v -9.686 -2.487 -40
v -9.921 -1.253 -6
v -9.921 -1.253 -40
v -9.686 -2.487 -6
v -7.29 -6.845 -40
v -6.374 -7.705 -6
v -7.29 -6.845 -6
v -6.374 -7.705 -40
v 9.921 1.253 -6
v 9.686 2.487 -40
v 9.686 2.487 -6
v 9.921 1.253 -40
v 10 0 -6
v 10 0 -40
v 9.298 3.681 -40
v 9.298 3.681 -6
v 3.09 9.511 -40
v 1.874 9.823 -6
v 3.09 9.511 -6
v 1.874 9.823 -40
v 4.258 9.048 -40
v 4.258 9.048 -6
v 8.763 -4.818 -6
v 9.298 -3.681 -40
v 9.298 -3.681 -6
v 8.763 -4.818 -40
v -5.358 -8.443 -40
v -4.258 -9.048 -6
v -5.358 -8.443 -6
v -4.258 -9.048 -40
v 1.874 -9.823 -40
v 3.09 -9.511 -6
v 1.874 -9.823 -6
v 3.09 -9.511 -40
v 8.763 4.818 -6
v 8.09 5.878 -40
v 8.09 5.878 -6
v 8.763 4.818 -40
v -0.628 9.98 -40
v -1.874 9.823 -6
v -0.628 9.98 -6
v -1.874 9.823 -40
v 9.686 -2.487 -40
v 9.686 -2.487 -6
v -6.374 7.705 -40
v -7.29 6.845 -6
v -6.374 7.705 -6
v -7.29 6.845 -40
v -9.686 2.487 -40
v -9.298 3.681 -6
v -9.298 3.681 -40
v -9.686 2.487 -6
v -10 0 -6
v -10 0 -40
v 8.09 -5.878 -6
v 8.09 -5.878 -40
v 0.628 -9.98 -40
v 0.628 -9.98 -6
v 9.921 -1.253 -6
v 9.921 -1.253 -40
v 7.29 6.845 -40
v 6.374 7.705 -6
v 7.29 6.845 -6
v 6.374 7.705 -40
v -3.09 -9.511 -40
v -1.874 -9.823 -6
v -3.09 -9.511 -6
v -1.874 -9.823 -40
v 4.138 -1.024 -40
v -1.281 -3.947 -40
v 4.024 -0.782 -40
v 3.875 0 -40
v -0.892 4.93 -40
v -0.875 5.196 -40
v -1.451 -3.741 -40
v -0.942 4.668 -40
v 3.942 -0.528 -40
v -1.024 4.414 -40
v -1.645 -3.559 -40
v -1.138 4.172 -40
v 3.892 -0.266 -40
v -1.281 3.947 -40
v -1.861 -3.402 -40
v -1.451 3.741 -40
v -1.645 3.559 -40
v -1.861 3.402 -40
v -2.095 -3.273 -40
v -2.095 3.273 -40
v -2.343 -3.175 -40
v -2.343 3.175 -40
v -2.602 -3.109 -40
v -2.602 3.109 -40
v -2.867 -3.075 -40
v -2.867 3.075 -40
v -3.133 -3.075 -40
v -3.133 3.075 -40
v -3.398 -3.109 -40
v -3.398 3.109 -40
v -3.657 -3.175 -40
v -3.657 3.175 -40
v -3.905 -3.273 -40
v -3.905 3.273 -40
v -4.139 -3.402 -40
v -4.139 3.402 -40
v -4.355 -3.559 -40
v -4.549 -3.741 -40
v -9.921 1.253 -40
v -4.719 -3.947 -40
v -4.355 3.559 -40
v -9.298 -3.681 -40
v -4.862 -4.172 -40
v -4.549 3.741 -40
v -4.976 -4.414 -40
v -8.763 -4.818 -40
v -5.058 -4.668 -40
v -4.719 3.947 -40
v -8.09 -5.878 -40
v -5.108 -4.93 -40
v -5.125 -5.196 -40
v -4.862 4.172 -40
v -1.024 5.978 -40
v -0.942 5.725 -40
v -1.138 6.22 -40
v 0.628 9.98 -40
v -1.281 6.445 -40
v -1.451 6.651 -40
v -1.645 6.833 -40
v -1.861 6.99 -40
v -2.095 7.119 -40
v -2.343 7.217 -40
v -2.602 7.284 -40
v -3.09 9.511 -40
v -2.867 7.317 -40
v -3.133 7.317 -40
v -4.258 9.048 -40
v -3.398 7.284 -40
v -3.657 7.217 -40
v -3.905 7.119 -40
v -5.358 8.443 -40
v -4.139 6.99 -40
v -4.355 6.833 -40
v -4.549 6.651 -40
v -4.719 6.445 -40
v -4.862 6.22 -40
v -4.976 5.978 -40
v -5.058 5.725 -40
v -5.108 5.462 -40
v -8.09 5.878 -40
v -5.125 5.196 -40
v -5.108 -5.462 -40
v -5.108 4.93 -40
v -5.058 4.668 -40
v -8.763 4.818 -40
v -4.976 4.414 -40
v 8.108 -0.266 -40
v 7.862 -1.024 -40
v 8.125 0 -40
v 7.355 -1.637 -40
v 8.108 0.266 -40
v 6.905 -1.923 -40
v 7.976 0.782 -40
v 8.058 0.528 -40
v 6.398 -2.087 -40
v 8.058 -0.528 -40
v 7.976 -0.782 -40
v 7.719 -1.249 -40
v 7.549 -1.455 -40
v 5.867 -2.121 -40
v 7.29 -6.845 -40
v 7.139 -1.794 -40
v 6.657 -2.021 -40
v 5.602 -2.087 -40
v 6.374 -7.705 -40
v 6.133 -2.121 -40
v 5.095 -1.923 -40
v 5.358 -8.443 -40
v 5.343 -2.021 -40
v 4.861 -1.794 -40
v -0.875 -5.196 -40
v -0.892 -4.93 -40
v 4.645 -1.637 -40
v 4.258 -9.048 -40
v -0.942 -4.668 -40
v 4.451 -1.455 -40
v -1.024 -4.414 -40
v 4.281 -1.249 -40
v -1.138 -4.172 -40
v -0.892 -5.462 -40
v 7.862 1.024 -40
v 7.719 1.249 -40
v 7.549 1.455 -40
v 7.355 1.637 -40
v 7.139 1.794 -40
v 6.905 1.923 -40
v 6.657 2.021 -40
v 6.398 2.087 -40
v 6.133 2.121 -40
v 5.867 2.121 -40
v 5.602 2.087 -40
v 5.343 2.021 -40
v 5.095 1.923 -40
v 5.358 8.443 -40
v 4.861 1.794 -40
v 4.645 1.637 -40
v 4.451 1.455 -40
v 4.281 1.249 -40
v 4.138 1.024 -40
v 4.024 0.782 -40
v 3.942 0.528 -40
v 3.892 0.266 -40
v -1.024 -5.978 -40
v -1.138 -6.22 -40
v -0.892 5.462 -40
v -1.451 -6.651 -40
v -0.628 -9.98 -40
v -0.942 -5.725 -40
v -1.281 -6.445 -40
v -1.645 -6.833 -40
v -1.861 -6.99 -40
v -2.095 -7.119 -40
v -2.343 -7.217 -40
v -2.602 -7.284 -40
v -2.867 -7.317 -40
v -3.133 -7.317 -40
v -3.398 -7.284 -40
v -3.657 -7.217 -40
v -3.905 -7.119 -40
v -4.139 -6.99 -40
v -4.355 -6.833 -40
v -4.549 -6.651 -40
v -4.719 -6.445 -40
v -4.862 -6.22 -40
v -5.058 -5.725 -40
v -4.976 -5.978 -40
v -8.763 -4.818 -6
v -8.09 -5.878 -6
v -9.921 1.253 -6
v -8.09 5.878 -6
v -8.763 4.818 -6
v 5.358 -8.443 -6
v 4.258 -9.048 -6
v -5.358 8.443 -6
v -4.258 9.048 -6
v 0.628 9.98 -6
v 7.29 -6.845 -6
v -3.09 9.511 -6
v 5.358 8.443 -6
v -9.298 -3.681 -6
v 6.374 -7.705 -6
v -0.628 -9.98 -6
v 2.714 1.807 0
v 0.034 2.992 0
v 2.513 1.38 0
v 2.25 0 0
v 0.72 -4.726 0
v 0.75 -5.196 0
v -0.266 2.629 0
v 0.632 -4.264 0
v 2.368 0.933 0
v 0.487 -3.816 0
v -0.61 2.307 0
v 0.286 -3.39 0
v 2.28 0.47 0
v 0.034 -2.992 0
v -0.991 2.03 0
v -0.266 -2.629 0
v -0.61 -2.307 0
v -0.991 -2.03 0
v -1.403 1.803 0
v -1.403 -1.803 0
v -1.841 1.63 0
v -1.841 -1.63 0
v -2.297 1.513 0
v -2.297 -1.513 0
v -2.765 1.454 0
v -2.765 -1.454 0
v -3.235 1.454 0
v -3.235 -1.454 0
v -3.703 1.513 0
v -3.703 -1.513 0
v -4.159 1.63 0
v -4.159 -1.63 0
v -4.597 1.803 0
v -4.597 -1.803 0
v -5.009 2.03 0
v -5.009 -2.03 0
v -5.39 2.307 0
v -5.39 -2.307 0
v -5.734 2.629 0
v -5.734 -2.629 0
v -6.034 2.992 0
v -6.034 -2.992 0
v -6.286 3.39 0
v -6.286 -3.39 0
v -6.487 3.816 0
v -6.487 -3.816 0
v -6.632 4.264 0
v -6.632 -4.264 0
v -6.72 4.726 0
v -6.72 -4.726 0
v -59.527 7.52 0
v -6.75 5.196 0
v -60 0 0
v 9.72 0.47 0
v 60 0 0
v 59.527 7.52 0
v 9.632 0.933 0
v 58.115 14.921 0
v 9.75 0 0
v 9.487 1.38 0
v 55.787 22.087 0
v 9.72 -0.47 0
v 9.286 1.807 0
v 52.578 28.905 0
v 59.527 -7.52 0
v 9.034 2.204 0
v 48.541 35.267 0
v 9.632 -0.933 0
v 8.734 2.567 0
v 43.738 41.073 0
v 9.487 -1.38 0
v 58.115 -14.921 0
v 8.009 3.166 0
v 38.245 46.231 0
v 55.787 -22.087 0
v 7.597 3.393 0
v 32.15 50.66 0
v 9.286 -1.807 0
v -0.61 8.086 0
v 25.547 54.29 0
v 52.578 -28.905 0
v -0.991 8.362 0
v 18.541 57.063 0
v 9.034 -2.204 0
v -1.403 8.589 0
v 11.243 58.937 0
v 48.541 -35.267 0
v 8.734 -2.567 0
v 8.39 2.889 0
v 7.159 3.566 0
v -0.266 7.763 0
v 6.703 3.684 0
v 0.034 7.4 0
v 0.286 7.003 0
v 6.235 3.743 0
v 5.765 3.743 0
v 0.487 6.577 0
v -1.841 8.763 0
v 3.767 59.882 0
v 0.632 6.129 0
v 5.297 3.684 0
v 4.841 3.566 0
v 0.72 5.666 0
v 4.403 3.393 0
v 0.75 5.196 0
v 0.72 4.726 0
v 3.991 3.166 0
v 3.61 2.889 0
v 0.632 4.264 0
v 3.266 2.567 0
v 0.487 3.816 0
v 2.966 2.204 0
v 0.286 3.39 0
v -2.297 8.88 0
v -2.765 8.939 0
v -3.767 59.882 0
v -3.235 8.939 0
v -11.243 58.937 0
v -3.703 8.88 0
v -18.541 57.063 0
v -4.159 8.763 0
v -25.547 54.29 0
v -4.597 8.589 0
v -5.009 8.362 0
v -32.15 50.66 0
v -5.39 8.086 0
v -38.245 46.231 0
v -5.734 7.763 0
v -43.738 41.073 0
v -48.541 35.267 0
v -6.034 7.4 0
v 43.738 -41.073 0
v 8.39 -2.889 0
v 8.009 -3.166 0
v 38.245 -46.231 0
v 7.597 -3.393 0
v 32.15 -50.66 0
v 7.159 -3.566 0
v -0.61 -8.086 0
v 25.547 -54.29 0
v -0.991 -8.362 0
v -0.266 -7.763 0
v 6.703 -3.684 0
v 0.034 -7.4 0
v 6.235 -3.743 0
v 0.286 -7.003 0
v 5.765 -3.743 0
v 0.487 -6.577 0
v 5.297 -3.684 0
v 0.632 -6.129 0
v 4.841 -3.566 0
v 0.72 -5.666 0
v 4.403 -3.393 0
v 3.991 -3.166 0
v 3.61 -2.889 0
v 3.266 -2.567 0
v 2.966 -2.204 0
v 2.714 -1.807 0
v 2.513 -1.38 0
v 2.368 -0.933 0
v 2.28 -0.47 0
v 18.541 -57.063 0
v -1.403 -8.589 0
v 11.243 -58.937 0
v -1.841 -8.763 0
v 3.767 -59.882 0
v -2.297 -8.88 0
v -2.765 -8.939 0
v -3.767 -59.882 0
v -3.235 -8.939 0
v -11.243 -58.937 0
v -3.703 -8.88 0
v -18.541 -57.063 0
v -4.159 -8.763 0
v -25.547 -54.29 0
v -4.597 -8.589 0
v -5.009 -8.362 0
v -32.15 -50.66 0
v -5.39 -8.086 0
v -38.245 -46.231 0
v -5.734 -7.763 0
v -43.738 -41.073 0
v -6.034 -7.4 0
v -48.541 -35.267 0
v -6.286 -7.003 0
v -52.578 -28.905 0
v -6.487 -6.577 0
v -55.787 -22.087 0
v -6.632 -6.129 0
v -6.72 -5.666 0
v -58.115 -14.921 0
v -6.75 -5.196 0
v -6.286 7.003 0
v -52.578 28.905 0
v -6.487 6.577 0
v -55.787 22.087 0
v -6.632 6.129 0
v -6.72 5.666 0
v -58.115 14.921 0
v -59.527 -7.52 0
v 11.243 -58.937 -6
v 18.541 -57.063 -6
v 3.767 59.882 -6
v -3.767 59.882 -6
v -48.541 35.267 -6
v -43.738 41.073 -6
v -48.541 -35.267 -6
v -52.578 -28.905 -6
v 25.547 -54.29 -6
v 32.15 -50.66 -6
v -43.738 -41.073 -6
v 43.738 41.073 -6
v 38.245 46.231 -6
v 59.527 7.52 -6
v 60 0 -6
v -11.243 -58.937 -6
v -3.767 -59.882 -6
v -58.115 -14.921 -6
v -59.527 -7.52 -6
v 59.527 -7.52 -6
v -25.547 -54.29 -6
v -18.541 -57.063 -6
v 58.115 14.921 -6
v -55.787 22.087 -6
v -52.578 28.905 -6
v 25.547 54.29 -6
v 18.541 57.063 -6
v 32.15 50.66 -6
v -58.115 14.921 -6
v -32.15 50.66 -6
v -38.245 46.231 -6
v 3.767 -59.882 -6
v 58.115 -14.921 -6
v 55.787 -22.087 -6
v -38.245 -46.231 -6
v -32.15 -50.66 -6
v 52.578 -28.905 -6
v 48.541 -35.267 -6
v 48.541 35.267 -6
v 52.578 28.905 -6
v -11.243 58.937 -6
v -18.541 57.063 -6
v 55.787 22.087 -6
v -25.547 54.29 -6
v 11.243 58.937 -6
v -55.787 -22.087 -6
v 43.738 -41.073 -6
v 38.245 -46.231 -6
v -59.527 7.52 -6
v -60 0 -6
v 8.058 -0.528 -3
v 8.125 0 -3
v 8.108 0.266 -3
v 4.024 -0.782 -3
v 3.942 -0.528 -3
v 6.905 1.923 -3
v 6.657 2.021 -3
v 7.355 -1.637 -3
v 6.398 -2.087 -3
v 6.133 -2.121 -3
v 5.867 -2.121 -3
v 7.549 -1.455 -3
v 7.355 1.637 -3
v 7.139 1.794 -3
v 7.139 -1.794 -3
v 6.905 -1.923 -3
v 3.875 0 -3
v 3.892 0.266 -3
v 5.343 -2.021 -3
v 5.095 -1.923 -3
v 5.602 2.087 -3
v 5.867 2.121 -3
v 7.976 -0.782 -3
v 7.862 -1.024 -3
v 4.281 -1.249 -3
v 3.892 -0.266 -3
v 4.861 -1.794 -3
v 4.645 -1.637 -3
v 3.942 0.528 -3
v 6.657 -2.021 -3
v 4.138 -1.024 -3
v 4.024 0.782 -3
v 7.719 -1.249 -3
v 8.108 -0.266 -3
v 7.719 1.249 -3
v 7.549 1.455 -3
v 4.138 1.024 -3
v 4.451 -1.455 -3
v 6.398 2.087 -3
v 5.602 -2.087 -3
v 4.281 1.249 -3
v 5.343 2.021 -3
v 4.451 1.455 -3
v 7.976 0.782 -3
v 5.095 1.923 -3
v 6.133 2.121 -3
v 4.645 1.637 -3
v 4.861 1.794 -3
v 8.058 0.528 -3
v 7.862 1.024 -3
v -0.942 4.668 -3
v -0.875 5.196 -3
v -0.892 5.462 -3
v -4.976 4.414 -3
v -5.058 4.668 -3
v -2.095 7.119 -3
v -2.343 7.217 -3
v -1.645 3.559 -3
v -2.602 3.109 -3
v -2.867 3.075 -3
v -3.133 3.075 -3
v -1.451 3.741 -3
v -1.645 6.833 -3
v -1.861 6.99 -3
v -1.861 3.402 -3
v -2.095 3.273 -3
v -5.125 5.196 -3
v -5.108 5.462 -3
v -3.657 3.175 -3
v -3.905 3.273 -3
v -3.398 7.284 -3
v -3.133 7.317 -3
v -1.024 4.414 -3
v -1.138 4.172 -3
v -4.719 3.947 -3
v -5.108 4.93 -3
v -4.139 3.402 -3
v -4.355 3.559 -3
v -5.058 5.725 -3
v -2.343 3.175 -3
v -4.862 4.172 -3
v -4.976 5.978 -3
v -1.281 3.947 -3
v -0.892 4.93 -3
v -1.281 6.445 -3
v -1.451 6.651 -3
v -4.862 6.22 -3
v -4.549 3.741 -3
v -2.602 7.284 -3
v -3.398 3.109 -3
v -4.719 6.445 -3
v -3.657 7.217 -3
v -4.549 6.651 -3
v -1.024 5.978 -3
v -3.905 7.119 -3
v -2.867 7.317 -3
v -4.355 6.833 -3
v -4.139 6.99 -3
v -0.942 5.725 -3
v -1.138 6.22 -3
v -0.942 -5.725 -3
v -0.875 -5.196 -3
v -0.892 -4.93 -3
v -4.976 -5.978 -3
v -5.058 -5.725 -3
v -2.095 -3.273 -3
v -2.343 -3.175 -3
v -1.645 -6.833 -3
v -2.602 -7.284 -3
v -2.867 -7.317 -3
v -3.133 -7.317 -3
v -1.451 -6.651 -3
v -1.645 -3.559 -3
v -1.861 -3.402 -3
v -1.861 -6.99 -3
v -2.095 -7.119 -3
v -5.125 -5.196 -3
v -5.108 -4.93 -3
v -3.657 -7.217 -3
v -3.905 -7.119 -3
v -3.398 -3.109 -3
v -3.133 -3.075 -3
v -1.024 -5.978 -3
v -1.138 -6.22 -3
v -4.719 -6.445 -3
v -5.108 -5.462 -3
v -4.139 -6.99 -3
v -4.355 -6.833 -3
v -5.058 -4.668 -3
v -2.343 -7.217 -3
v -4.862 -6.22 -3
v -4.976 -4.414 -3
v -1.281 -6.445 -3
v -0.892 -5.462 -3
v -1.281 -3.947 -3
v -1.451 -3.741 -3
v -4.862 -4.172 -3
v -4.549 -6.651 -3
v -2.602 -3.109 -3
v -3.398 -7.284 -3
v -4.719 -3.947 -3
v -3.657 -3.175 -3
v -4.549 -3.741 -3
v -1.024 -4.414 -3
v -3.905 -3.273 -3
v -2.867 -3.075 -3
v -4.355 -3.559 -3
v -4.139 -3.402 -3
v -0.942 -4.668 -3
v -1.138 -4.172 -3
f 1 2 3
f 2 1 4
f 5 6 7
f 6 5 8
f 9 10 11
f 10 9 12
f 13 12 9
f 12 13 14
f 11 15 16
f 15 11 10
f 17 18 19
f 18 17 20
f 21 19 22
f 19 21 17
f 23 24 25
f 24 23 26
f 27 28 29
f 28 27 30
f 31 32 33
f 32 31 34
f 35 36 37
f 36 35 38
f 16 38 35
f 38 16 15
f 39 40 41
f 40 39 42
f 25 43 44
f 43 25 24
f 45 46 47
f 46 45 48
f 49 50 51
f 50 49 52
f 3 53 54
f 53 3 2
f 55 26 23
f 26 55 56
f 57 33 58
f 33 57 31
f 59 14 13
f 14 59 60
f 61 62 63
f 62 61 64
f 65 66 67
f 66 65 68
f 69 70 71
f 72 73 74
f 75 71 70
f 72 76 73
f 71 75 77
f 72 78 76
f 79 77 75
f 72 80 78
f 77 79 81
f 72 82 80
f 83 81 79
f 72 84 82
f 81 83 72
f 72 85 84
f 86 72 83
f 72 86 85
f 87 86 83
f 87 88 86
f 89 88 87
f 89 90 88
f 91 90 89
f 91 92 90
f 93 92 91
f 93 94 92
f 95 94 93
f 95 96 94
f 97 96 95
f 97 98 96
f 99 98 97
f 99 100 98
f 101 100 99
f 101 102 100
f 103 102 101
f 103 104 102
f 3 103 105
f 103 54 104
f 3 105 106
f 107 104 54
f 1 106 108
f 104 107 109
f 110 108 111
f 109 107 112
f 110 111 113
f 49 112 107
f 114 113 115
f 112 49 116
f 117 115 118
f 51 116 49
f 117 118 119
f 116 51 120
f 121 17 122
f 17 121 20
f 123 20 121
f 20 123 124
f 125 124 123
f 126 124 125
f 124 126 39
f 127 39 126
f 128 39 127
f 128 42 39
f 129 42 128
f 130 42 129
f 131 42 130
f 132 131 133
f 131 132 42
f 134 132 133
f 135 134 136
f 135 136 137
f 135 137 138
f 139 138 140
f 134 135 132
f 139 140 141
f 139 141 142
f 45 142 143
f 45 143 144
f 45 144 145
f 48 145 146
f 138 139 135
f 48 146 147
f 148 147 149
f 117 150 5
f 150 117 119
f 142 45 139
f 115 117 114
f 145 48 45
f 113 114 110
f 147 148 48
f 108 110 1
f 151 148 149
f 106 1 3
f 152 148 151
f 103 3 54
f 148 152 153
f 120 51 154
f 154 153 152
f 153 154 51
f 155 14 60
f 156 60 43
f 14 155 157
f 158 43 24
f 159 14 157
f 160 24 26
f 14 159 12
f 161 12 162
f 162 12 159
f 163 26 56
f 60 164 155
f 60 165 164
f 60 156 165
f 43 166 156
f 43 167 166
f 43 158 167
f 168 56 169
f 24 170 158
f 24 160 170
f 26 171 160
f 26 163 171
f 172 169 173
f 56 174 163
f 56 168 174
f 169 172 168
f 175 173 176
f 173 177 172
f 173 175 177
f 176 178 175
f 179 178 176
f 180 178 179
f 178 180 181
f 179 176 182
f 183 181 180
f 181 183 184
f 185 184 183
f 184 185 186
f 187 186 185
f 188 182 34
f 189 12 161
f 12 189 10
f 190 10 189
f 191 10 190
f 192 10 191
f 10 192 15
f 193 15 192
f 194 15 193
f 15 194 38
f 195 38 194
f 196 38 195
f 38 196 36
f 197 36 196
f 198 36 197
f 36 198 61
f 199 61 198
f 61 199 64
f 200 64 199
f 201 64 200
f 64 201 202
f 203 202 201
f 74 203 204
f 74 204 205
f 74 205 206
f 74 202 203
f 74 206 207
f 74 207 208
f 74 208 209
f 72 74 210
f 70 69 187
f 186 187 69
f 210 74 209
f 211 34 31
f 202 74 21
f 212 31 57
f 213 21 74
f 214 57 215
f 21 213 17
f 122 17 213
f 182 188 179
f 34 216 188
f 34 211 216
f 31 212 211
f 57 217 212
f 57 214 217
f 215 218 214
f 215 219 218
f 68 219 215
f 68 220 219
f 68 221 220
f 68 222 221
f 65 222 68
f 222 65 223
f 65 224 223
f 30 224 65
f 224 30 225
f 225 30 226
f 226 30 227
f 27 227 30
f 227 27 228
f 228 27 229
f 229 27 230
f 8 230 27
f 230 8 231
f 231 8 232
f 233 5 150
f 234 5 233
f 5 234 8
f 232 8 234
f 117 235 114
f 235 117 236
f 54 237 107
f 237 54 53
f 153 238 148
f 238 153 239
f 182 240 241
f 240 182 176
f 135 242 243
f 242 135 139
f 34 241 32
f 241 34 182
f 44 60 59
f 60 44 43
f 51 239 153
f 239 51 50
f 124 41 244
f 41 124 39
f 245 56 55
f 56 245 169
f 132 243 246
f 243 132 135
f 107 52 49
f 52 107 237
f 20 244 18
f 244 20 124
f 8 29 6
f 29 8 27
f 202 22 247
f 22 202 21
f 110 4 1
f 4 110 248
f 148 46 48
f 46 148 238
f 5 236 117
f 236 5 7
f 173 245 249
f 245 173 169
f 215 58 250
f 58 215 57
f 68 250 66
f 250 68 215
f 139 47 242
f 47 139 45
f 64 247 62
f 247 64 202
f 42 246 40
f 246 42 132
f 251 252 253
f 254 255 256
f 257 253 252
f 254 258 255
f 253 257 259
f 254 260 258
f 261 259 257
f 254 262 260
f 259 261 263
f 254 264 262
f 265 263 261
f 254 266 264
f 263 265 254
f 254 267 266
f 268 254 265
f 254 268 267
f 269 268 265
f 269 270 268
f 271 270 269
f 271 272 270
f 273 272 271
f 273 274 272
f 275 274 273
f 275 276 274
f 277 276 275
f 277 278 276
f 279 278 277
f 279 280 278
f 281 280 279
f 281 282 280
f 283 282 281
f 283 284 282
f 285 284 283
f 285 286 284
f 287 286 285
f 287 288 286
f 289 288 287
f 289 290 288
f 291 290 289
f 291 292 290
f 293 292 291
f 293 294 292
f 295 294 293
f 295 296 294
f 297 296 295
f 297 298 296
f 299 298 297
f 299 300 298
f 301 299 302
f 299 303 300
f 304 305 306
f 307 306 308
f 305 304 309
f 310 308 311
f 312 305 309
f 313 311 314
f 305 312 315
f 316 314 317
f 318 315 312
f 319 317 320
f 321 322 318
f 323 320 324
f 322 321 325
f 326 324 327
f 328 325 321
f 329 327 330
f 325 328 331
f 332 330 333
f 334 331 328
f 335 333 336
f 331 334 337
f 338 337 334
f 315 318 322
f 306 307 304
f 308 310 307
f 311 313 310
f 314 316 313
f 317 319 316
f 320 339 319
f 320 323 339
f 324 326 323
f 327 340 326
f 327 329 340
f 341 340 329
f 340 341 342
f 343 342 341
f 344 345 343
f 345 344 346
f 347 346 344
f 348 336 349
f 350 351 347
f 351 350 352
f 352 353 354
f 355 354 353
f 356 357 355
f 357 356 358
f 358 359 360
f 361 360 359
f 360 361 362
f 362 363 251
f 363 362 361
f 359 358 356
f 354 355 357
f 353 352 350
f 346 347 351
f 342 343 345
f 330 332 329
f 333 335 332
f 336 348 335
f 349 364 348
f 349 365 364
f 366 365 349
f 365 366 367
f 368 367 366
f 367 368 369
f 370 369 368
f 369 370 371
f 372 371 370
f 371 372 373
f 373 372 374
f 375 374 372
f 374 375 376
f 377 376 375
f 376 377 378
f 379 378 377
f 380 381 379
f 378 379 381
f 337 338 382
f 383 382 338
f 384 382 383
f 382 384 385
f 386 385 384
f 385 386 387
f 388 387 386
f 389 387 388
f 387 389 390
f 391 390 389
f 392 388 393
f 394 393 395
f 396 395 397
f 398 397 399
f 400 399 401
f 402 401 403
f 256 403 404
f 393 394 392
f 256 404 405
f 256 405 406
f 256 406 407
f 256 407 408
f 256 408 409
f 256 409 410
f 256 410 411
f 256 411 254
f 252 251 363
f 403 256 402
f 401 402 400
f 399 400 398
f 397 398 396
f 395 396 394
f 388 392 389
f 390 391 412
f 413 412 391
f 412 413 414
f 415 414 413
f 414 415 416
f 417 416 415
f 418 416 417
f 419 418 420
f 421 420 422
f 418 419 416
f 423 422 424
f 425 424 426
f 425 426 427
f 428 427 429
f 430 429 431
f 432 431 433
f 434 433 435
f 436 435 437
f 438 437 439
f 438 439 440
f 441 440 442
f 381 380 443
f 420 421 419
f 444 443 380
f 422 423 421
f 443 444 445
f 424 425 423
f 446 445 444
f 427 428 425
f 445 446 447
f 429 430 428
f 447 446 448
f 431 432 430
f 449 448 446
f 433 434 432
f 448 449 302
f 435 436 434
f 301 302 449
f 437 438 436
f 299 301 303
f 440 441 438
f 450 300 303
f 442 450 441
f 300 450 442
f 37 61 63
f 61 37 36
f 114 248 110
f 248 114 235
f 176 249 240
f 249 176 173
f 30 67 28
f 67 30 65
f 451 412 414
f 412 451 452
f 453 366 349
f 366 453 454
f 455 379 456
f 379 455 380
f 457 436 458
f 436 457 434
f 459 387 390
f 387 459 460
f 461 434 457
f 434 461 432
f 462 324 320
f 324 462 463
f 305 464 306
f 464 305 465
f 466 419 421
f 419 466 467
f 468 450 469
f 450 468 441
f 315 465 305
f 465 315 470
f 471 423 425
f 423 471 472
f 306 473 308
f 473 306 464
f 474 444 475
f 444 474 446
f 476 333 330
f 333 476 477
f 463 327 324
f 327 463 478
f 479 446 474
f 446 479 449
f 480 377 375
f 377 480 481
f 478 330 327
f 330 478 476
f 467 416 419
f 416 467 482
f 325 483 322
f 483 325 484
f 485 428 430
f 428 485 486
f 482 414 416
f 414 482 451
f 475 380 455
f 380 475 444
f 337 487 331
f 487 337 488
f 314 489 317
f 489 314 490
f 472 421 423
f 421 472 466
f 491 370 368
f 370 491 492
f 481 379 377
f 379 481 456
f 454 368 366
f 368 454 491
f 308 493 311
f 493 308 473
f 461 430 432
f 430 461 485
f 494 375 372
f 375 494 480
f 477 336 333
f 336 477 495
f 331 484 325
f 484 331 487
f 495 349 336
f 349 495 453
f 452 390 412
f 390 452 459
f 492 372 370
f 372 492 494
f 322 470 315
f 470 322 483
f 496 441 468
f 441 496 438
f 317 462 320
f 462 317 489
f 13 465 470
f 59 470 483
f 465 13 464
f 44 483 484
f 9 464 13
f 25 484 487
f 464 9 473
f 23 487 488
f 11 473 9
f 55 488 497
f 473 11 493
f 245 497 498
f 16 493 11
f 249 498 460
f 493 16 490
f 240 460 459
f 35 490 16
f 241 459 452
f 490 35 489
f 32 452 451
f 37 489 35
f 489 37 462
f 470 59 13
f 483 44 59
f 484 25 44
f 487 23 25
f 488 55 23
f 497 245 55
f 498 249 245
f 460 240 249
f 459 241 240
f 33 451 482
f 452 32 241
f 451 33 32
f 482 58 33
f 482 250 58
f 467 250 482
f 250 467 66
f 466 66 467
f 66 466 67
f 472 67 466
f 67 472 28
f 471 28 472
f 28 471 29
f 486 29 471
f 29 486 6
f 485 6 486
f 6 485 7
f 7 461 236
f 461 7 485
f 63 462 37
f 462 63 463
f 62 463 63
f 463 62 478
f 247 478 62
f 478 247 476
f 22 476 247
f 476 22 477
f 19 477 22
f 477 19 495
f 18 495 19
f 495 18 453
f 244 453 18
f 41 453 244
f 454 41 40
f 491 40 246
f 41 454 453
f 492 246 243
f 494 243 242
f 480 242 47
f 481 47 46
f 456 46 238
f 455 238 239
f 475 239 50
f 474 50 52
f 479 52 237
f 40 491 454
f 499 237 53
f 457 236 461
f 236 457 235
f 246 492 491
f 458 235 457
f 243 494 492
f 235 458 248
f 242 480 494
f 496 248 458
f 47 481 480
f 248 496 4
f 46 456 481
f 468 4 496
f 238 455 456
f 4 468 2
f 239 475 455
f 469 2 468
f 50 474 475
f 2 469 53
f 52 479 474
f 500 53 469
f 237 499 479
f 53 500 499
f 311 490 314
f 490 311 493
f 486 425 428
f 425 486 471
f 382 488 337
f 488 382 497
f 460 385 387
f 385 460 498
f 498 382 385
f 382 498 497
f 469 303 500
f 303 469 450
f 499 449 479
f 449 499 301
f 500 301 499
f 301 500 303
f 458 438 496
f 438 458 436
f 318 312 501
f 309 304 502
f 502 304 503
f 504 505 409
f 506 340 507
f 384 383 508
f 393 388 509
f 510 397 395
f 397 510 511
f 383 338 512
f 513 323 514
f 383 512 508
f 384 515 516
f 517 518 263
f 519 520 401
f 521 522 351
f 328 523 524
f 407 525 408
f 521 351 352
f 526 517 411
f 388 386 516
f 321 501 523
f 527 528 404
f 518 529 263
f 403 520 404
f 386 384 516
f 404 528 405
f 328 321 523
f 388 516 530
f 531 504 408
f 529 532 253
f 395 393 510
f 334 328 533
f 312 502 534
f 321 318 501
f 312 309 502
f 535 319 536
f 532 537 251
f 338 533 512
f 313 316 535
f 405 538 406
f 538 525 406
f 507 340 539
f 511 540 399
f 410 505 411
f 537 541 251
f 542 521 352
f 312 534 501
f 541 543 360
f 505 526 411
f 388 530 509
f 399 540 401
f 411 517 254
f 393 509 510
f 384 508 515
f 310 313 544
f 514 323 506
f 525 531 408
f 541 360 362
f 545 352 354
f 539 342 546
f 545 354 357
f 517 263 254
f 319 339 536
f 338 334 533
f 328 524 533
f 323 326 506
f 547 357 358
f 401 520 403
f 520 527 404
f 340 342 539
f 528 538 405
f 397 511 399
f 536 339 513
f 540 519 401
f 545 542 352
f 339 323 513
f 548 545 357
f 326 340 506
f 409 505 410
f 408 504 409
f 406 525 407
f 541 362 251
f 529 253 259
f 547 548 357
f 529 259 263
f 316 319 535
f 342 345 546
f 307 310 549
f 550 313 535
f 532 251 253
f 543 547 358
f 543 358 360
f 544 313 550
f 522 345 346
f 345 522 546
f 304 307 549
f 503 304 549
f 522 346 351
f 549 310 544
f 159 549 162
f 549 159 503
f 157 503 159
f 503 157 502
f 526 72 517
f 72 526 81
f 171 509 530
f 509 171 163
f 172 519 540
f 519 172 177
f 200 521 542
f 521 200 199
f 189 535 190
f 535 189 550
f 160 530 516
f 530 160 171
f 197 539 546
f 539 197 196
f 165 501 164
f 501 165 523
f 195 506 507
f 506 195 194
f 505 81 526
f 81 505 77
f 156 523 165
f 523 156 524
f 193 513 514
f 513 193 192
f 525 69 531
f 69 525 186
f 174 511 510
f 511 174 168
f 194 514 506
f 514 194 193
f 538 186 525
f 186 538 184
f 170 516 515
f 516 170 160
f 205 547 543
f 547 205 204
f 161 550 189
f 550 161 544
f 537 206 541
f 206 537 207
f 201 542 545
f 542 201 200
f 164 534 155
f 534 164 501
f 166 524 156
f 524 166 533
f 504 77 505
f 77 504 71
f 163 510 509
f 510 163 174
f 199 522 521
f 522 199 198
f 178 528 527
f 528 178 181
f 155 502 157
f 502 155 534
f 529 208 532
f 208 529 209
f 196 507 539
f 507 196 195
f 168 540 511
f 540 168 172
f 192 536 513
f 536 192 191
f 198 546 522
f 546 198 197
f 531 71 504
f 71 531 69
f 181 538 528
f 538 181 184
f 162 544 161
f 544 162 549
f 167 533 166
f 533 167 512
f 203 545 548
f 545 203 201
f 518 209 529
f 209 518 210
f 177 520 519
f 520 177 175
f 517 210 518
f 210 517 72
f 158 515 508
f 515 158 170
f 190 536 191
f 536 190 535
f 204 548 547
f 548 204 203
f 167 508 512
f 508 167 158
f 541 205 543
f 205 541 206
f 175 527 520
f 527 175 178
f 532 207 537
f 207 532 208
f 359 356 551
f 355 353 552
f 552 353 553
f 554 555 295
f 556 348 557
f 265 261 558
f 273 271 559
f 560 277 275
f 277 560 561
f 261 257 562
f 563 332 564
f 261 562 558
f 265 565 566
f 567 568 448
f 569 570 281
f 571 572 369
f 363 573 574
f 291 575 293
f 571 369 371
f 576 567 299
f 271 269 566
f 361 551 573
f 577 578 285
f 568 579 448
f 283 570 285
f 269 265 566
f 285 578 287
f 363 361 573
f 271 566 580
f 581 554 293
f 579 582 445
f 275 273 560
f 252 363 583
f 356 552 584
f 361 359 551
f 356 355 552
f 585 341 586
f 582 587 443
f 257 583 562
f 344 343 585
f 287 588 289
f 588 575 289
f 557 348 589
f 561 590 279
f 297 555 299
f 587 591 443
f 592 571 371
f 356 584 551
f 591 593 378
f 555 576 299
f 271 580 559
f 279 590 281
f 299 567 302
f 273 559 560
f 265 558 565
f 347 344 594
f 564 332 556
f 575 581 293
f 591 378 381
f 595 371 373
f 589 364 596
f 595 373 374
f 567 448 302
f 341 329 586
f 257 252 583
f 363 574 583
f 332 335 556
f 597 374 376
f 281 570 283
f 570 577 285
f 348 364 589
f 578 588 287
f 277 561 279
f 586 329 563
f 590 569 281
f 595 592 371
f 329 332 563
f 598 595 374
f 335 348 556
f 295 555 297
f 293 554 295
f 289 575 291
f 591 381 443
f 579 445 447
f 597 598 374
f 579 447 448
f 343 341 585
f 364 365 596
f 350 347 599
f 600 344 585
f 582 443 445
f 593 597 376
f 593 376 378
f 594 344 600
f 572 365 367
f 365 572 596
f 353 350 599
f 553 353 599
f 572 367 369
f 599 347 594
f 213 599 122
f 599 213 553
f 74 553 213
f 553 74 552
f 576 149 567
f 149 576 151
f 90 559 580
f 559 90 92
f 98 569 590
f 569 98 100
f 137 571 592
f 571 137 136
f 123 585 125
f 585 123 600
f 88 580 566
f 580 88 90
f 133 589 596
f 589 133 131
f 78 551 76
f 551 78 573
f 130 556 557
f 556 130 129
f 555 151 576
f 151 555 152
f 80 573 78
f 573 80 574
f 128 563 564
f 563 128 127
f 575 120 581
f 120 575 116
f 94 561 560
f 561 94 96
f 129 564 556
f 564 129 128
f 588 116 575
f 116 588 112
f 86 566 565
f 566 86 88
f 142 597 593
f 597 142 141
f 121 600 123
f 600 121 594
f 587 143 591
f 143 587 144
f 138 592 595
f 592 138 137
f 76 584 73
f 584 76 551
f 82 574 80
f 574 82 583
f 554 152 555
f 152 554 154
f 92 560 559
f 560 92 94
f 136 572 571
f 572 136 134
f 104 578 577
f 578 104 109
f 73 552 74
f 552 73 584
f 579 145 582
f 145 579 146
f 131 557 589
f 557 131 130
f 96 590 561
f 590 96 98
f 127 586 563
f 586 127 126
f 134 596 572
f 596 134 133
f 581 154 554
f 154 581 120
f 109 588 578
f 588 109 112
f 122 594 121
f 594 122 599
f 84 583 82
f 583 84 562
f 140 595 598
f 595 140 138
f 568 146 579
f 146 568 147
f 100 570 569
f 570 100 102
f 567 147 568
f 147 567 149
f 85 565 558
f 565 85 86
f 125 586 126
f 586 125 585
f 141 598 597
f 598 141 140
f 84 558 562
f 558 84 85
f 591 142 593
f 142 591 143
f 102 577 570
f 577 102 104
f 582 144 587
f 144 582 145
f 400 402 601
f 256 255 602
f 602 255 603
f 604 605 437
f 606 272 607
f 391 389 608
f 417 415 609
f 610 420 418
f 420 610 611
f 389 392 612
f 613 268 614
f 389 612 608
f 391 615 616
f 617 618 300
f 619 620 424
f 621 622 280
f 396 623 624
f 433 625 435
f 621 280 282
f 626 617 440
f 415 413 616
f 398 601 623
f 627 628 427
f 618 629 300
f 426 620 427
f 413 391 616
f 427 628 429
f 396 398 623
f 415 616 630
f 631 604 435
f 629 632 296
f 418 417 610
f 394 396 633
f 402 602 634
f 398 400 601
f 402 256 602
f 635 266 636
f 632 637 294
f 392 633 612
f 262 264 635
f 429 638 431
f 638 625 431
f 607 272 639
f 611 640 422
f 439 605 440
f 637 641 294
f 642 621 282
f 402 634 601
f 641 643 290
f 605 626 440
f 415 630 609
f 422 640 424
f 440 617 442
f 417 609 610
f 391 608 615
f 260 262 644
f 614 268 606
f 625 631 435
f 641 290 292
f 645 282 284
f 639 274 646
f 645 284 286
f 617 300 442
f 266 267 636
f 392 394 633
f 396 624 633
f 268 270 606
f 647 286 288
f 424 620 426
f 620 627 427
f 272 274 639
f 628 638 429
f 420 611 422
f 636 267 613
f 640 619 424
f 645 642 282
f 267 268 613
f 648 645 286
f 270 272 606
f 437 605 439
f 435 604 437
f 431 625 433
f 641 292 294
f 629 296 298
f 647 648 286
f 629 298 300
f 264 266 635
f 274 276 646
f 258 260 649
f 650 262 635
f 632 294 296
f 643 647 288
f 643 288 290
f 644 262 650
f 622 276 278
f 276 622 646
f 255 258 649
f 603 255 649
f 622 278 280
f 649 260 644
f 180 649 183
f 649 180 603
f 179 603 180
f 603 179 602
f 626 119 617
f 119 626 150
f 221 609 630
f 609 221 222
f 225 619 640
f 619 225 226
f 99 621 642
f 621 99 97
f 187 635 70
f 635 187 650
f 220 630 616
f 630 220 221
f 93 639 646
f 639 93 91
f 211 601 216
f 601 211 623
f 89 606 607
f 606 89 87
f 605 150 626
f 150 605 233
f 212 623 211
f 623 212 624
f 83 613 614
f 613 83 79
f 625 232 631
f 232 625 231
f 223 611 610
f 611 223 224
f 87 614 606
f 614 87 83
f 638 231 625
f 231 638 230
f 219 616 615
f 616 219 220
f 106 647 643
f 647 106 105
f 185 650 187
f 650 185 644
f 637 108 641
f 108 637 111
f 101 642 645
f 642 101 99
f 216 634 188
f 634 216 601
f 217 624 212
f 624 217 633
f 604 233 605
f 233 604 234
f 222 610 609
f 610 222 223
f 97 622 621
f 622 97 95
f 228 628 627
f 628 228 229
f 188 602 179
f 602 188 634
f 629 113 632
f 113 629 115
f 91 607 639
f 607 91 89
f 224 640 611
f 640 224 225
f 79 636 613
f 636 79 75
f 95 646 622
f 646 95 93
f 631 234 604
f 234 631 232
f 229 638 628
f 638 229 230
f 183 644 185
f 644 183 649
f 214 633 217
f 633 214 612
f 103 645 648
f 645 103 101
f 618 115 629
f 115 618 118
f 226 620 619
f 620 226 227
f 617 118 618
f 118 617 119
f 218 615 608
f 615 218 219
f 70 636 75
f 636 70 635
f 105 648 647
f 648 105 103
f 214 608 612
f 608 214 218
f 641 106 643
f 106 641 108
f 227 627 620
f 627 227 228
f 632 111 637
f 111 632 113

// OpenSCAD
$fn = 50;


difference() {
	union() {
		translate(v = [0, 0, -40.0000000000]) {
			cylinder(h = 40, r = 10.0000000000);
		}
		translate(v = [0, 0, -6.0000000000]) {
			cylinder(h = 6, r = 60.0000000000);
		}
	}
	union() {
		translate(v = [6.0000000000, 0.0000000000, 0]) {
			rotate(a = [0, 0, 0]) {
				difference() {
					union() {
						#translate(v = [0, 0, -40.0000000000]) {
							cylinder(h = 40, r = 2.0000000000);
						}
						#translate(v = [0, 0, -3]) {
							cylinder(h = 3, r = 10.0000000000, r1 = 2.1250000000, r2 = 3.7500000000);
						}
						#translate(v = [0, 0, -40.0000000000]) {
							cylinder(h = 40, r = 2.1250000000);
						}
						#translate(v = [0, 0, -40.0000000000]) {
							cylinder(h = 40, r = 2.0000000000);
						}
					}
					union();
				}
			}
		}
		translate(v = [-3.0000000000, 5.1961524227, 0]) {
			rotate(a = [0, 0, 0]) {
				difference() {
					union() {
						#translate(v = [0, 0, -40.0000000000]) {
							cylinder(h = 40, r = 2.0000000000);
						}
						#translate(v = [0, 0, -3]) {
							cylinder(h = 3, r = 10.0000000000, r1 = 2.1250000000, r2 = 3.7500000000);
						}
						#translate(v = [0, 0, -40.0000000000]) {
							cylinder(h = 40, r = 2.1250000000);
						}
						#translate(v = [0, 0, -40.0000000000]) {
							cylinder(h = 40, r = 2.0000000000);
						}
					}
					union();
				}
			}
		}
		translate(v = [-3.0000000000, -5.1961524227, 0]) {
			rotate(a = [0, 0, 0]) {
				difference() {
					union() {
						#translate(v = [0, 0, -40.0000000000]) {
							cylinder(h = 40, r = 2.0000000000);
						}
						#translate(v = [0, 0, -3]) {
							cylinder(h = 3, r = 10.0000000000, r1 = 2.1250000000, r2 = 3.7500000000);
						}
						#translate(v = [0, 0, -40.0000000000]) {
							cylinder(h = 40, r = 2.1250000000);
						}
						#translate(v = [0, 0, -40.0000000000]) {
							cylinder(h = 40, r = 2.0000000000);
						}
					}
					union();
				}
			}
		}
	}
}
